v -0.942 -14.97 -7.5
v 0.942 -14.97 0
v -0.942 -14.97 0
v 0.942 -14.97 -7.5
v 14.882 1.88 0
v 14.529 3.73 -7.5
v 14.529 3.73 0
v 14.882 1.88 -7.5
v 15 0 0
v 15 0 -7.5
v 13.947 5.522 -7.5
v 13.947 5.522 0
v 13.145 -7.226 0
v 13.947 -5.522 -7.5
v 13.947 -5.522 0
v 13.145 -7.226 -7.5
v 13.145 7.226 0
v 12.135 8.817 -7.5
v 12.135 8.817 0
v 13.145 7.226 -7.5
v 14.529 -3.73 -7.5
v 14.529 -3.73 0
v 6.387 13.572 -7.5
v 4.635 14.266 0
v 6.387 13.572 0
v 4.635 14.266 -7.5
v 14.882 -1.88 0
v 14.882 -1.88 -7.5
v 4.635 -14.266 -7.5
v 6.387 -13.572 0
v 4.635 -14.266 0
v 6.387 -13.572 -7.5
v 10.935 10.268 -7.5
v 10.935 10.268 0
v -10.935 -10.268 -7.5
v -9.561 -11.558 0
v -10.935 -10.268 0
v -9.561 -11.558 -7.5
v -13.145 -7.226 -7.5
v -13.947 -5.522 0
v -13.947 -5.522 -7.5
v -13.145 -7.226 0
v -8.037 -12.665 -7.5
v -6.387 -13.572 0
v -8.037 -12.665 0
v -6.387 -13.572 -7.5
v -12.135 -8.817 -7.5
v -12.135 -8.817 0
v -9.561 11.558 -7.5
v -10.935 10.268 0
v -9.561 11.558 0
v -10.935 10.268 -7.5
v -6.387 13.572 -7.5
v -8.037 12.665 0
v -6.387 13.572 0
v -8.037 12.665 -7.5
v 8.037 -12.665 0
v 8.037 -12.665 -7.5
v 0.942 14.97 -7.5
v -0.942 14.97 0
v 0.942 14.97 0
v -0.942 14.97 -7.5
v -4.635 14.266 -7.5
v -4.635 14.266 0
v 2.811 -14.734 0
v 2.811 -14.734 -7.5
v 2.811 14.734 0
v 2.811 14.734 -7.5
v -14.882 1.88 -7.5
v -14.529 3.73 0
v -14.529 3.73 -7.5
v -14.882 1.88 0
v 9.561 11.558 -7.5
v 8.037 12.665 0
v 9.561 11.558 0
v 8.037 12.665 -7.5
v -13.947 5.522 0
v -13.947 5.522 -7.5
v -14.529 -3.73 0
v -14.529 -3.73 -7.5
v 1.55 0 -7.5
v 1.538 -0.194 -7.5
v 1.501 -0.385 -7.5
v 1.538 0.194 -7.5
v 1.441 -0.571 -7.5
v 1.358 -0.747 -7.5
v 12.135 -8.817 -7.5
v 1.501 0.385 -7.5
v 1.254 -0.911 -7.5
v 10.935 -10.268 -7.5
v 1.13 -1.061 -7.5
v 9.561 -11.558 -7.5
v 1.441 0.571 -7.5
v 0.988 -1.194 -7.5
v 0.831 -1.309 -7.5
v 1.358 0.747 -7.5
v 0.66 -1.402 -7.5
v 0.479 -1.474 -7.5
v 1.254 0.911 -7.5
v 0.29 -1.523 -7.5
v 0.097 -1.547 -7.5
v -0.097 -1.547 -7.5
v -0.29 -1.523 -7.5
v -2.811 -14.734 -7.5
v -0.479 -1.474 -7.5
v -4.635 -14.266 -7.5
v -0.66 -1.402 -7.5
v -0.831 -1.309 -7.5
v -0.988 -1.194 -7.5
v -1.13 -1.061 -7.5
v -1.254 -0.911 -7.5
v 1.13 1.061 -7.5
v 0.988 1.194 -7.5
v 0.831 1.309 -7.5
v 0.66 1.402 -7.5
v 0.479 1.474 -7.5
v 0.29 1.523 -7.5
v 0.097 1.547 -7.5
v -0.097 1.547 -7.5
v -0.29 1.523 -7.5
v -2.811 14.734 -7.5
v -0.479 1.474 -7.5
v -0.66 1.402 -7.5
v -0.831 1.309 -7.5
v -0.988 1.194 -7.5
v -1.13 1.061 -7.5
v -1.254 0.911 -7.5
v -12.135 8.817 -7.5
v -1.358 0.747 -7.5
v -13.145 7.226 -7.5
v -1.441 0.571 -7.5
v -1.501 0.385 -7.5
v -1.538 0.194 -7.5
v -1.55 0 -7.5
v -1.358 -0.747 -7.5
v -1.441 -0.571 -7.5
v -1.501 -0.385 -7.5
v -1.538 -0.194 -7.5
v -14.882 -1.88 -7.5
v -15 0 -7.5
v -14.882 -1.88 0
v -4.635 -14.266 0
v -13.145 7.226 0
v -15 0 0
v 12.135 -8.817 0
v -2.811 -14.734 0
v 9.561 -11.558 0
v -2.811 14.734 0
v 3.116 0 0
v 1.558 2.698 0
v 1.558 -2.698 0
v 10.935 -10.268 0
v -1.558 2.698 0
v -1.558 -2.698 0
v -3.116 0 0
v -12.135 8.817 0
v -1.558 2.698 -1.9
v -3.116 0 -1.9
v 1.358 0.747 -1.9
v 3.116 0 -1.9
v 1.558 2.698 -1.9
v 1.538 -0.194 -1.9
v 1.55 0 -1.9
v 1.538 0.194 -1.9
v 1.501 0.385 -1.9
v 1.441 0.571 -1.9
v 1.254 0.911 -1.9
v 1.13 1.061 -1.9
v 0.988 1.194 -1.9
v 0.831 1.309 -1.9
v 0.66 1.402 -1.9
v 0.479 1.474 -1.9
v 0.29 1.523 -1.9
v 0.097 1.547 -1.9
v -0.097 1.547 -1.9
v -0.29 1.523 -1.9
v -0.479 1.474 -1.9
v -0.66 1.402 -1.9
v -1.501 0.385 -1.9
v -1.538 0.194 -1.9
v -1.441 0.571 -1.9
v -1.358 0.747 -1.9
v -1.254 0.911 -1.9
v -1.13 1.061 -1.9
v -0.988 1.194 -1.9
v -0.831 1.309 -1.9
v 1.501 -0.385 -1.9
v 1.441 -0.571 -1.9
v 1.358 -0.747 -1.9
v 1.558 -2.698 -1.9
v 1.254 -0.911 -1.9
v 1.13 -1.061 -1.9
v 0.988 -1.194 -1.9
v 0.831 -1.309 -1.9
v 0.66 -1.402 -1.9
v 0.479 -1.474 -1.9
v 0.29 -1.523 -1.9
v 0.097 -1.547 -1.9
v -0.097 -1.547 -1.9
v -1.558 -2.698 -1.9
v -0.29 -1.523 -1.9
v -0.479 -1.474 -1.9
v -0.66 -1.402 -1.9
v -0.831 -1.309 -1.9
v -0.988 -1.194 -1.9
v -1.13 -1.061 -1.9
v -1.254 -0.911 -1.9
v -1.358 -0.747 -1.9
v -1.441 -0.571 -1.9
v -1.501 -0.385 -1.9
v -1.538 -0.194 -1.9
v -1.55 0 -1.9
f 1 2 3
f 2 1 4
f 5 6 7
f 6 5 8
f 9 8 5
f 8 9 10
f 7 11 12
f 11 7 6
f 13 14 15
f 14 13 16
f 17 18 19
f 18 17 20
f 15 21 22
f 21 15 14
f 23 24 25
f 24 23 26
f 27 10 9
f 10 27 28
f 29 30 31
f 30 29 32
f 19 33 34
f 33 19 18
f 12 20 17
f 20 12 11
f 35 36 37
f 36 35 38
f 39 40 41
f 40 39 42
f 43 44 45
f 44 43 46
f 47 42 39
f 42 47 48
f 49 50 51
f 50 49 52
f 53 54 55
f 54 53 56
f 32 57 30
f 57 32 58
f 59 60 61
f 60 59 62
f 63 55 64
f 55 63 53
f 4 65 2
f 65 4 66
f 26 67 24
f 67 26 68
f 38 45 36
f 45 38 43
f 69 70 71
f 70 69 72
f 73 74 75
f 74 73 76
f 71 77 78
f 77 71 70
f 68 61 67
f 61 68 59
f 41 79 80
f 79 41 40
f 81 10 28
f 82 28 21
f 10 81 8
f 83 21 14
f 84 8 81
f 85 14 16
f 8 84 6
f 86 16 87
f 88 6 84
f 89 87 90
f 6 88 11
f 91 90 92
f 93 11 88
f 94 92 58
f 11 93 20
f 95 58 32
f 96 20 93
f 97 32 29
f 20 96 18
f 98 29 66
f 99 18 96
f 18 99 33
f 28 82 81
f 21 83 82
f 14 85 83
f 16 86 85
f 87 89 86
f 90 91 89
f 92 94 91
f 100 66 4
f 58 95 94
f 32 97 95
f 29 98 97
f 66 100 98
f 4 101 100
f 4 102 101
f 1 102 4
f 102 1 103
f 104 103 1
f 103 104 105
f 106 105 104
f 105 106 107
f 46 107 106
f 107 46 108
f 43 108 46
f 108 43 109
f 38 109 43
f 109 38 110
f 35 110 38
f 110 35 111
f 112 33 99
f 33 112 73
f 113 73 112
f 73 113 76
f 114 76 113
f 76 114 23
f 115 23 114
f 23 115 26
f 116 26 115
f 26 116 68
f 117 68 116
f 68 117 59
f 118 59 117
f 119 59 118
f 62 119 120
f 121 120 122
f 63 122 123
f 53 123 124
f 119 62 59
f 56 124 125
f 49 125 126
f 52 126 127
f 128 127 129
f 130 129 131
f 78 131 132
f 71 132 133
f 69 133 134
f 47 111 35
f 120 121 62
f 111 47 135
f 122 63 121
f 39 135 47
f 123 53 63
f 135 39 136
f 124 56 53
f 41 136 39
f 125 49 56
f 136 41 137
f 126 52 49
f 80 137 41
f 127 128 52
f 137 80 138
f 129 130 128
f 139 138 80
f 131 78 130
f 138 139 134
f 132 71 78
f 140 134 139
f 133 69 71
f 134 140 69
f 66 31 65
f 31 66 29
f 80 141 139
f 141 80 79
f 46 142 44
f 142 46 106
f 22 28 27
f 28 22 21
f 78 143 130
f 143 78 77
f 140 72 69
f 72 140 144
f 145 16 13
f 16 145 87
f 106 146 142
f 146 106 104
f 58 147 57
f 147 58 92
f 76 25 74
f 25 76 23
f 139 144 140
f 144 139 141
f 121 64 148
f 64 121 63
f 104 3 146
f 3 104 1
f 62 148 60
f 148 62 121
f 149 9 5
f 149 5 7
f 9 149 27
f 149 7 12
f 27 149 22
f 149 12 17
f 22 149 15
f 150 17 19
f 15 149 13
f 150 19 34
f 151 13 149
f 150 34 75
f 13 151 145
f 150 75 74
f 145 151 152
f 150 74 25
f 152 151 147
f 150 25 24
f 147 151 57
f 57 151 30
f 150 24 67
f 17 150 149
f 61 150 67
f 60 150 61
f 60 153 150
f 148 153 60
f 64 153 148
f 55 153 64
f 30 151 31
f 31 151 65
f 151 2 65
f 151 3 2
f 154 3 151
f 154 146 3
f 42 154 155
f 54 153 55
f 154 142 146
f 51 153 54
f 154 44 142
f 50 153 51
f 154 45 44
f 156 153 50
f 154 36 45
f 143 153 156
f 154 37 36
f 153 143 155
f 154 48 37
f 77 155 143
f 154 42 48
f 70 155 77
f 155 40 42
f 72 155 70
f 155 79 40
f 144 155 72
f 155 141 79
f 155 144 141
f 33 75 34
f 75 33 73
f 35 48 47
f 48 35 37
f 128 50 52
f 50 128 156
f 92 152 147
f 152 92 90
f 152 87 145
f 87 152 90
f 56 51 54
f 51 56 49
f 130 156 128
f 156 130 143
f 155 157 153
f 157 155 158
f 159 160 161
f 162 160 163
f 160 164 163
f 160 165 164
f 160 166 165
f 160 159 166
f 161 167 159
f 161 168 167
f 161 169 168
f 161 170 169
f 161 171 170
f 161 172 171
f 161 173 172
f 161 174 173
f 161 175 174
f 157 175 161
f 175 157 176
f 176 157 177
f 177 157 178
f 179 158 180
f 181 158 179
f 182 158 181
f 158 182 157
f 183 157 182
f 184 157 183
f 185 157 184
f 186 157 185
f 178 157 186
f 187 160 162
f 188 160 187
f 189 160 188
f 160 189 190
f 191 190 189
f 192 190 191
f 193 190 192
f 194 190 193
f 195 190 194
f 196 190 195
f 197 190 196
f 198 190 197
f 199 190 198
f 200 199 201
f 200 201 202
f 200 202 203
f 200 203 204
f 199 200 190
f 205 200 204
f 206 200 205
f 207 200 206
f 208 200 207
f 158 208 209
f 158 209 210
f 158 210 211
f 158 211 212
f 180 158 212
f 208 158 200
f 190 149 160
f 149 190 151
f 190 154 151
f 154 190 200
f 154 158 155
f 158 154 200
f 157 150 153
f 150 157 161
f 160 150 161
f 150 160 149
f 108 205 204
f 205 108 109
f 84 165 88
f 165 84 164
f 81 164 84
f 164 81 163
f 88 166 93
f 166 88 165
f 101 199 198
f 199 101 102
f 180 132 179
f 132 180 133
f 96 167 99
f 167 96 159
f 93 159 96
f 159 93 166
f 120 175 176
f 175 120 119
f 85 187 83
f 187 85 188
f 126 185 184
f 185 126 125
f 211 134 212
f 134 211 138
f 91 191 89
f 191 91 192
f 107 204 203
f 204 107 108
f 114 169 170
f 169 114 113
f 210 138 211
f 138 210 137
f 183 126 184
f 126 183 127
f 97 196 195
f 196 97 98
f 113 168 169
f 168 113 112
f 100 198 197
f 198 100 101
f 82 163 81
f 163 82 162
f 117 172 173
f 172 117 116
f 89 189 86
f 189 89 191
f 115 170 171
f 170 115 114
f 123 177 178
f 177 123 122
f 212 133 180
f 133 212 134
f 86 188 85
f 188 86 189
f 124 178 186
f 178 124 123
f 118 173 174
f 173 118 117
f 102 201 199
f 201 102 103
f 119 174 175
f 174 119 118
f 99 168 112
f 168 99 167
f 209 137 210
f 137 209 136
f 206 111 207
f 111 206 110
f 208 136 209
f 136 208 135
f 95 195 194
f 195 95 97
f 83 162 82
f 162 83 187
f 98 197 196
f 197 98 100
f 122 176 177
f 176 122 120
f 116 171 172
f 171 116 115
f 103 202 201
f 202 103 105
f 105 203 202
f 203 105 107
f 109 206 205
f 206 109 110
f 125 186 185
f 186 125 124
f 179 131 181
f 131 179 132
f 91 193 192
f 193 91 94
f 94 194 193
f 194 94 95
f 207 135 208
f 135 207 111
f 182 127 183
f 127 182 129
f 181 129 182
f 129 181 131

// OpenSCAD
$fn = 50;


difference() {
	union() {
		translate(v = [0, 0, -7.5000000000]) {
			cylinder(h = 7.5000000000, r = 15.0000000000);
		}
		translate(v = [0, 0, -6.0000000000]) {
			cylinder(h = 6, r = 2.8750000000);
		}
	}
	union() {
		translate(v = [0, 0, 0]) {
			rotate(a = [0, 0, 0]) {
				difference() {
					union() {
						translate(v = [0, 0, -1.9000000000]) {
							linear_extrude(height = 1.9000000000) {
								polygon(points = [[3.1158000000, 0.0000000000], [1.5579000000, 2.6983619531], [-1.5579000000, 2.6983619531], [-3.1158000000, 0.0000000000], [-1.5579000000, -2.6983619531], [1.5579000000, -2.6983619531]]);
							}
						}
					}
					union();
				}
			}
		}
		#translate(v = [0, 0, -100.0000000000]) {
			cylinder(h = 200, r = 1.5500000000);
		}
	}
}
